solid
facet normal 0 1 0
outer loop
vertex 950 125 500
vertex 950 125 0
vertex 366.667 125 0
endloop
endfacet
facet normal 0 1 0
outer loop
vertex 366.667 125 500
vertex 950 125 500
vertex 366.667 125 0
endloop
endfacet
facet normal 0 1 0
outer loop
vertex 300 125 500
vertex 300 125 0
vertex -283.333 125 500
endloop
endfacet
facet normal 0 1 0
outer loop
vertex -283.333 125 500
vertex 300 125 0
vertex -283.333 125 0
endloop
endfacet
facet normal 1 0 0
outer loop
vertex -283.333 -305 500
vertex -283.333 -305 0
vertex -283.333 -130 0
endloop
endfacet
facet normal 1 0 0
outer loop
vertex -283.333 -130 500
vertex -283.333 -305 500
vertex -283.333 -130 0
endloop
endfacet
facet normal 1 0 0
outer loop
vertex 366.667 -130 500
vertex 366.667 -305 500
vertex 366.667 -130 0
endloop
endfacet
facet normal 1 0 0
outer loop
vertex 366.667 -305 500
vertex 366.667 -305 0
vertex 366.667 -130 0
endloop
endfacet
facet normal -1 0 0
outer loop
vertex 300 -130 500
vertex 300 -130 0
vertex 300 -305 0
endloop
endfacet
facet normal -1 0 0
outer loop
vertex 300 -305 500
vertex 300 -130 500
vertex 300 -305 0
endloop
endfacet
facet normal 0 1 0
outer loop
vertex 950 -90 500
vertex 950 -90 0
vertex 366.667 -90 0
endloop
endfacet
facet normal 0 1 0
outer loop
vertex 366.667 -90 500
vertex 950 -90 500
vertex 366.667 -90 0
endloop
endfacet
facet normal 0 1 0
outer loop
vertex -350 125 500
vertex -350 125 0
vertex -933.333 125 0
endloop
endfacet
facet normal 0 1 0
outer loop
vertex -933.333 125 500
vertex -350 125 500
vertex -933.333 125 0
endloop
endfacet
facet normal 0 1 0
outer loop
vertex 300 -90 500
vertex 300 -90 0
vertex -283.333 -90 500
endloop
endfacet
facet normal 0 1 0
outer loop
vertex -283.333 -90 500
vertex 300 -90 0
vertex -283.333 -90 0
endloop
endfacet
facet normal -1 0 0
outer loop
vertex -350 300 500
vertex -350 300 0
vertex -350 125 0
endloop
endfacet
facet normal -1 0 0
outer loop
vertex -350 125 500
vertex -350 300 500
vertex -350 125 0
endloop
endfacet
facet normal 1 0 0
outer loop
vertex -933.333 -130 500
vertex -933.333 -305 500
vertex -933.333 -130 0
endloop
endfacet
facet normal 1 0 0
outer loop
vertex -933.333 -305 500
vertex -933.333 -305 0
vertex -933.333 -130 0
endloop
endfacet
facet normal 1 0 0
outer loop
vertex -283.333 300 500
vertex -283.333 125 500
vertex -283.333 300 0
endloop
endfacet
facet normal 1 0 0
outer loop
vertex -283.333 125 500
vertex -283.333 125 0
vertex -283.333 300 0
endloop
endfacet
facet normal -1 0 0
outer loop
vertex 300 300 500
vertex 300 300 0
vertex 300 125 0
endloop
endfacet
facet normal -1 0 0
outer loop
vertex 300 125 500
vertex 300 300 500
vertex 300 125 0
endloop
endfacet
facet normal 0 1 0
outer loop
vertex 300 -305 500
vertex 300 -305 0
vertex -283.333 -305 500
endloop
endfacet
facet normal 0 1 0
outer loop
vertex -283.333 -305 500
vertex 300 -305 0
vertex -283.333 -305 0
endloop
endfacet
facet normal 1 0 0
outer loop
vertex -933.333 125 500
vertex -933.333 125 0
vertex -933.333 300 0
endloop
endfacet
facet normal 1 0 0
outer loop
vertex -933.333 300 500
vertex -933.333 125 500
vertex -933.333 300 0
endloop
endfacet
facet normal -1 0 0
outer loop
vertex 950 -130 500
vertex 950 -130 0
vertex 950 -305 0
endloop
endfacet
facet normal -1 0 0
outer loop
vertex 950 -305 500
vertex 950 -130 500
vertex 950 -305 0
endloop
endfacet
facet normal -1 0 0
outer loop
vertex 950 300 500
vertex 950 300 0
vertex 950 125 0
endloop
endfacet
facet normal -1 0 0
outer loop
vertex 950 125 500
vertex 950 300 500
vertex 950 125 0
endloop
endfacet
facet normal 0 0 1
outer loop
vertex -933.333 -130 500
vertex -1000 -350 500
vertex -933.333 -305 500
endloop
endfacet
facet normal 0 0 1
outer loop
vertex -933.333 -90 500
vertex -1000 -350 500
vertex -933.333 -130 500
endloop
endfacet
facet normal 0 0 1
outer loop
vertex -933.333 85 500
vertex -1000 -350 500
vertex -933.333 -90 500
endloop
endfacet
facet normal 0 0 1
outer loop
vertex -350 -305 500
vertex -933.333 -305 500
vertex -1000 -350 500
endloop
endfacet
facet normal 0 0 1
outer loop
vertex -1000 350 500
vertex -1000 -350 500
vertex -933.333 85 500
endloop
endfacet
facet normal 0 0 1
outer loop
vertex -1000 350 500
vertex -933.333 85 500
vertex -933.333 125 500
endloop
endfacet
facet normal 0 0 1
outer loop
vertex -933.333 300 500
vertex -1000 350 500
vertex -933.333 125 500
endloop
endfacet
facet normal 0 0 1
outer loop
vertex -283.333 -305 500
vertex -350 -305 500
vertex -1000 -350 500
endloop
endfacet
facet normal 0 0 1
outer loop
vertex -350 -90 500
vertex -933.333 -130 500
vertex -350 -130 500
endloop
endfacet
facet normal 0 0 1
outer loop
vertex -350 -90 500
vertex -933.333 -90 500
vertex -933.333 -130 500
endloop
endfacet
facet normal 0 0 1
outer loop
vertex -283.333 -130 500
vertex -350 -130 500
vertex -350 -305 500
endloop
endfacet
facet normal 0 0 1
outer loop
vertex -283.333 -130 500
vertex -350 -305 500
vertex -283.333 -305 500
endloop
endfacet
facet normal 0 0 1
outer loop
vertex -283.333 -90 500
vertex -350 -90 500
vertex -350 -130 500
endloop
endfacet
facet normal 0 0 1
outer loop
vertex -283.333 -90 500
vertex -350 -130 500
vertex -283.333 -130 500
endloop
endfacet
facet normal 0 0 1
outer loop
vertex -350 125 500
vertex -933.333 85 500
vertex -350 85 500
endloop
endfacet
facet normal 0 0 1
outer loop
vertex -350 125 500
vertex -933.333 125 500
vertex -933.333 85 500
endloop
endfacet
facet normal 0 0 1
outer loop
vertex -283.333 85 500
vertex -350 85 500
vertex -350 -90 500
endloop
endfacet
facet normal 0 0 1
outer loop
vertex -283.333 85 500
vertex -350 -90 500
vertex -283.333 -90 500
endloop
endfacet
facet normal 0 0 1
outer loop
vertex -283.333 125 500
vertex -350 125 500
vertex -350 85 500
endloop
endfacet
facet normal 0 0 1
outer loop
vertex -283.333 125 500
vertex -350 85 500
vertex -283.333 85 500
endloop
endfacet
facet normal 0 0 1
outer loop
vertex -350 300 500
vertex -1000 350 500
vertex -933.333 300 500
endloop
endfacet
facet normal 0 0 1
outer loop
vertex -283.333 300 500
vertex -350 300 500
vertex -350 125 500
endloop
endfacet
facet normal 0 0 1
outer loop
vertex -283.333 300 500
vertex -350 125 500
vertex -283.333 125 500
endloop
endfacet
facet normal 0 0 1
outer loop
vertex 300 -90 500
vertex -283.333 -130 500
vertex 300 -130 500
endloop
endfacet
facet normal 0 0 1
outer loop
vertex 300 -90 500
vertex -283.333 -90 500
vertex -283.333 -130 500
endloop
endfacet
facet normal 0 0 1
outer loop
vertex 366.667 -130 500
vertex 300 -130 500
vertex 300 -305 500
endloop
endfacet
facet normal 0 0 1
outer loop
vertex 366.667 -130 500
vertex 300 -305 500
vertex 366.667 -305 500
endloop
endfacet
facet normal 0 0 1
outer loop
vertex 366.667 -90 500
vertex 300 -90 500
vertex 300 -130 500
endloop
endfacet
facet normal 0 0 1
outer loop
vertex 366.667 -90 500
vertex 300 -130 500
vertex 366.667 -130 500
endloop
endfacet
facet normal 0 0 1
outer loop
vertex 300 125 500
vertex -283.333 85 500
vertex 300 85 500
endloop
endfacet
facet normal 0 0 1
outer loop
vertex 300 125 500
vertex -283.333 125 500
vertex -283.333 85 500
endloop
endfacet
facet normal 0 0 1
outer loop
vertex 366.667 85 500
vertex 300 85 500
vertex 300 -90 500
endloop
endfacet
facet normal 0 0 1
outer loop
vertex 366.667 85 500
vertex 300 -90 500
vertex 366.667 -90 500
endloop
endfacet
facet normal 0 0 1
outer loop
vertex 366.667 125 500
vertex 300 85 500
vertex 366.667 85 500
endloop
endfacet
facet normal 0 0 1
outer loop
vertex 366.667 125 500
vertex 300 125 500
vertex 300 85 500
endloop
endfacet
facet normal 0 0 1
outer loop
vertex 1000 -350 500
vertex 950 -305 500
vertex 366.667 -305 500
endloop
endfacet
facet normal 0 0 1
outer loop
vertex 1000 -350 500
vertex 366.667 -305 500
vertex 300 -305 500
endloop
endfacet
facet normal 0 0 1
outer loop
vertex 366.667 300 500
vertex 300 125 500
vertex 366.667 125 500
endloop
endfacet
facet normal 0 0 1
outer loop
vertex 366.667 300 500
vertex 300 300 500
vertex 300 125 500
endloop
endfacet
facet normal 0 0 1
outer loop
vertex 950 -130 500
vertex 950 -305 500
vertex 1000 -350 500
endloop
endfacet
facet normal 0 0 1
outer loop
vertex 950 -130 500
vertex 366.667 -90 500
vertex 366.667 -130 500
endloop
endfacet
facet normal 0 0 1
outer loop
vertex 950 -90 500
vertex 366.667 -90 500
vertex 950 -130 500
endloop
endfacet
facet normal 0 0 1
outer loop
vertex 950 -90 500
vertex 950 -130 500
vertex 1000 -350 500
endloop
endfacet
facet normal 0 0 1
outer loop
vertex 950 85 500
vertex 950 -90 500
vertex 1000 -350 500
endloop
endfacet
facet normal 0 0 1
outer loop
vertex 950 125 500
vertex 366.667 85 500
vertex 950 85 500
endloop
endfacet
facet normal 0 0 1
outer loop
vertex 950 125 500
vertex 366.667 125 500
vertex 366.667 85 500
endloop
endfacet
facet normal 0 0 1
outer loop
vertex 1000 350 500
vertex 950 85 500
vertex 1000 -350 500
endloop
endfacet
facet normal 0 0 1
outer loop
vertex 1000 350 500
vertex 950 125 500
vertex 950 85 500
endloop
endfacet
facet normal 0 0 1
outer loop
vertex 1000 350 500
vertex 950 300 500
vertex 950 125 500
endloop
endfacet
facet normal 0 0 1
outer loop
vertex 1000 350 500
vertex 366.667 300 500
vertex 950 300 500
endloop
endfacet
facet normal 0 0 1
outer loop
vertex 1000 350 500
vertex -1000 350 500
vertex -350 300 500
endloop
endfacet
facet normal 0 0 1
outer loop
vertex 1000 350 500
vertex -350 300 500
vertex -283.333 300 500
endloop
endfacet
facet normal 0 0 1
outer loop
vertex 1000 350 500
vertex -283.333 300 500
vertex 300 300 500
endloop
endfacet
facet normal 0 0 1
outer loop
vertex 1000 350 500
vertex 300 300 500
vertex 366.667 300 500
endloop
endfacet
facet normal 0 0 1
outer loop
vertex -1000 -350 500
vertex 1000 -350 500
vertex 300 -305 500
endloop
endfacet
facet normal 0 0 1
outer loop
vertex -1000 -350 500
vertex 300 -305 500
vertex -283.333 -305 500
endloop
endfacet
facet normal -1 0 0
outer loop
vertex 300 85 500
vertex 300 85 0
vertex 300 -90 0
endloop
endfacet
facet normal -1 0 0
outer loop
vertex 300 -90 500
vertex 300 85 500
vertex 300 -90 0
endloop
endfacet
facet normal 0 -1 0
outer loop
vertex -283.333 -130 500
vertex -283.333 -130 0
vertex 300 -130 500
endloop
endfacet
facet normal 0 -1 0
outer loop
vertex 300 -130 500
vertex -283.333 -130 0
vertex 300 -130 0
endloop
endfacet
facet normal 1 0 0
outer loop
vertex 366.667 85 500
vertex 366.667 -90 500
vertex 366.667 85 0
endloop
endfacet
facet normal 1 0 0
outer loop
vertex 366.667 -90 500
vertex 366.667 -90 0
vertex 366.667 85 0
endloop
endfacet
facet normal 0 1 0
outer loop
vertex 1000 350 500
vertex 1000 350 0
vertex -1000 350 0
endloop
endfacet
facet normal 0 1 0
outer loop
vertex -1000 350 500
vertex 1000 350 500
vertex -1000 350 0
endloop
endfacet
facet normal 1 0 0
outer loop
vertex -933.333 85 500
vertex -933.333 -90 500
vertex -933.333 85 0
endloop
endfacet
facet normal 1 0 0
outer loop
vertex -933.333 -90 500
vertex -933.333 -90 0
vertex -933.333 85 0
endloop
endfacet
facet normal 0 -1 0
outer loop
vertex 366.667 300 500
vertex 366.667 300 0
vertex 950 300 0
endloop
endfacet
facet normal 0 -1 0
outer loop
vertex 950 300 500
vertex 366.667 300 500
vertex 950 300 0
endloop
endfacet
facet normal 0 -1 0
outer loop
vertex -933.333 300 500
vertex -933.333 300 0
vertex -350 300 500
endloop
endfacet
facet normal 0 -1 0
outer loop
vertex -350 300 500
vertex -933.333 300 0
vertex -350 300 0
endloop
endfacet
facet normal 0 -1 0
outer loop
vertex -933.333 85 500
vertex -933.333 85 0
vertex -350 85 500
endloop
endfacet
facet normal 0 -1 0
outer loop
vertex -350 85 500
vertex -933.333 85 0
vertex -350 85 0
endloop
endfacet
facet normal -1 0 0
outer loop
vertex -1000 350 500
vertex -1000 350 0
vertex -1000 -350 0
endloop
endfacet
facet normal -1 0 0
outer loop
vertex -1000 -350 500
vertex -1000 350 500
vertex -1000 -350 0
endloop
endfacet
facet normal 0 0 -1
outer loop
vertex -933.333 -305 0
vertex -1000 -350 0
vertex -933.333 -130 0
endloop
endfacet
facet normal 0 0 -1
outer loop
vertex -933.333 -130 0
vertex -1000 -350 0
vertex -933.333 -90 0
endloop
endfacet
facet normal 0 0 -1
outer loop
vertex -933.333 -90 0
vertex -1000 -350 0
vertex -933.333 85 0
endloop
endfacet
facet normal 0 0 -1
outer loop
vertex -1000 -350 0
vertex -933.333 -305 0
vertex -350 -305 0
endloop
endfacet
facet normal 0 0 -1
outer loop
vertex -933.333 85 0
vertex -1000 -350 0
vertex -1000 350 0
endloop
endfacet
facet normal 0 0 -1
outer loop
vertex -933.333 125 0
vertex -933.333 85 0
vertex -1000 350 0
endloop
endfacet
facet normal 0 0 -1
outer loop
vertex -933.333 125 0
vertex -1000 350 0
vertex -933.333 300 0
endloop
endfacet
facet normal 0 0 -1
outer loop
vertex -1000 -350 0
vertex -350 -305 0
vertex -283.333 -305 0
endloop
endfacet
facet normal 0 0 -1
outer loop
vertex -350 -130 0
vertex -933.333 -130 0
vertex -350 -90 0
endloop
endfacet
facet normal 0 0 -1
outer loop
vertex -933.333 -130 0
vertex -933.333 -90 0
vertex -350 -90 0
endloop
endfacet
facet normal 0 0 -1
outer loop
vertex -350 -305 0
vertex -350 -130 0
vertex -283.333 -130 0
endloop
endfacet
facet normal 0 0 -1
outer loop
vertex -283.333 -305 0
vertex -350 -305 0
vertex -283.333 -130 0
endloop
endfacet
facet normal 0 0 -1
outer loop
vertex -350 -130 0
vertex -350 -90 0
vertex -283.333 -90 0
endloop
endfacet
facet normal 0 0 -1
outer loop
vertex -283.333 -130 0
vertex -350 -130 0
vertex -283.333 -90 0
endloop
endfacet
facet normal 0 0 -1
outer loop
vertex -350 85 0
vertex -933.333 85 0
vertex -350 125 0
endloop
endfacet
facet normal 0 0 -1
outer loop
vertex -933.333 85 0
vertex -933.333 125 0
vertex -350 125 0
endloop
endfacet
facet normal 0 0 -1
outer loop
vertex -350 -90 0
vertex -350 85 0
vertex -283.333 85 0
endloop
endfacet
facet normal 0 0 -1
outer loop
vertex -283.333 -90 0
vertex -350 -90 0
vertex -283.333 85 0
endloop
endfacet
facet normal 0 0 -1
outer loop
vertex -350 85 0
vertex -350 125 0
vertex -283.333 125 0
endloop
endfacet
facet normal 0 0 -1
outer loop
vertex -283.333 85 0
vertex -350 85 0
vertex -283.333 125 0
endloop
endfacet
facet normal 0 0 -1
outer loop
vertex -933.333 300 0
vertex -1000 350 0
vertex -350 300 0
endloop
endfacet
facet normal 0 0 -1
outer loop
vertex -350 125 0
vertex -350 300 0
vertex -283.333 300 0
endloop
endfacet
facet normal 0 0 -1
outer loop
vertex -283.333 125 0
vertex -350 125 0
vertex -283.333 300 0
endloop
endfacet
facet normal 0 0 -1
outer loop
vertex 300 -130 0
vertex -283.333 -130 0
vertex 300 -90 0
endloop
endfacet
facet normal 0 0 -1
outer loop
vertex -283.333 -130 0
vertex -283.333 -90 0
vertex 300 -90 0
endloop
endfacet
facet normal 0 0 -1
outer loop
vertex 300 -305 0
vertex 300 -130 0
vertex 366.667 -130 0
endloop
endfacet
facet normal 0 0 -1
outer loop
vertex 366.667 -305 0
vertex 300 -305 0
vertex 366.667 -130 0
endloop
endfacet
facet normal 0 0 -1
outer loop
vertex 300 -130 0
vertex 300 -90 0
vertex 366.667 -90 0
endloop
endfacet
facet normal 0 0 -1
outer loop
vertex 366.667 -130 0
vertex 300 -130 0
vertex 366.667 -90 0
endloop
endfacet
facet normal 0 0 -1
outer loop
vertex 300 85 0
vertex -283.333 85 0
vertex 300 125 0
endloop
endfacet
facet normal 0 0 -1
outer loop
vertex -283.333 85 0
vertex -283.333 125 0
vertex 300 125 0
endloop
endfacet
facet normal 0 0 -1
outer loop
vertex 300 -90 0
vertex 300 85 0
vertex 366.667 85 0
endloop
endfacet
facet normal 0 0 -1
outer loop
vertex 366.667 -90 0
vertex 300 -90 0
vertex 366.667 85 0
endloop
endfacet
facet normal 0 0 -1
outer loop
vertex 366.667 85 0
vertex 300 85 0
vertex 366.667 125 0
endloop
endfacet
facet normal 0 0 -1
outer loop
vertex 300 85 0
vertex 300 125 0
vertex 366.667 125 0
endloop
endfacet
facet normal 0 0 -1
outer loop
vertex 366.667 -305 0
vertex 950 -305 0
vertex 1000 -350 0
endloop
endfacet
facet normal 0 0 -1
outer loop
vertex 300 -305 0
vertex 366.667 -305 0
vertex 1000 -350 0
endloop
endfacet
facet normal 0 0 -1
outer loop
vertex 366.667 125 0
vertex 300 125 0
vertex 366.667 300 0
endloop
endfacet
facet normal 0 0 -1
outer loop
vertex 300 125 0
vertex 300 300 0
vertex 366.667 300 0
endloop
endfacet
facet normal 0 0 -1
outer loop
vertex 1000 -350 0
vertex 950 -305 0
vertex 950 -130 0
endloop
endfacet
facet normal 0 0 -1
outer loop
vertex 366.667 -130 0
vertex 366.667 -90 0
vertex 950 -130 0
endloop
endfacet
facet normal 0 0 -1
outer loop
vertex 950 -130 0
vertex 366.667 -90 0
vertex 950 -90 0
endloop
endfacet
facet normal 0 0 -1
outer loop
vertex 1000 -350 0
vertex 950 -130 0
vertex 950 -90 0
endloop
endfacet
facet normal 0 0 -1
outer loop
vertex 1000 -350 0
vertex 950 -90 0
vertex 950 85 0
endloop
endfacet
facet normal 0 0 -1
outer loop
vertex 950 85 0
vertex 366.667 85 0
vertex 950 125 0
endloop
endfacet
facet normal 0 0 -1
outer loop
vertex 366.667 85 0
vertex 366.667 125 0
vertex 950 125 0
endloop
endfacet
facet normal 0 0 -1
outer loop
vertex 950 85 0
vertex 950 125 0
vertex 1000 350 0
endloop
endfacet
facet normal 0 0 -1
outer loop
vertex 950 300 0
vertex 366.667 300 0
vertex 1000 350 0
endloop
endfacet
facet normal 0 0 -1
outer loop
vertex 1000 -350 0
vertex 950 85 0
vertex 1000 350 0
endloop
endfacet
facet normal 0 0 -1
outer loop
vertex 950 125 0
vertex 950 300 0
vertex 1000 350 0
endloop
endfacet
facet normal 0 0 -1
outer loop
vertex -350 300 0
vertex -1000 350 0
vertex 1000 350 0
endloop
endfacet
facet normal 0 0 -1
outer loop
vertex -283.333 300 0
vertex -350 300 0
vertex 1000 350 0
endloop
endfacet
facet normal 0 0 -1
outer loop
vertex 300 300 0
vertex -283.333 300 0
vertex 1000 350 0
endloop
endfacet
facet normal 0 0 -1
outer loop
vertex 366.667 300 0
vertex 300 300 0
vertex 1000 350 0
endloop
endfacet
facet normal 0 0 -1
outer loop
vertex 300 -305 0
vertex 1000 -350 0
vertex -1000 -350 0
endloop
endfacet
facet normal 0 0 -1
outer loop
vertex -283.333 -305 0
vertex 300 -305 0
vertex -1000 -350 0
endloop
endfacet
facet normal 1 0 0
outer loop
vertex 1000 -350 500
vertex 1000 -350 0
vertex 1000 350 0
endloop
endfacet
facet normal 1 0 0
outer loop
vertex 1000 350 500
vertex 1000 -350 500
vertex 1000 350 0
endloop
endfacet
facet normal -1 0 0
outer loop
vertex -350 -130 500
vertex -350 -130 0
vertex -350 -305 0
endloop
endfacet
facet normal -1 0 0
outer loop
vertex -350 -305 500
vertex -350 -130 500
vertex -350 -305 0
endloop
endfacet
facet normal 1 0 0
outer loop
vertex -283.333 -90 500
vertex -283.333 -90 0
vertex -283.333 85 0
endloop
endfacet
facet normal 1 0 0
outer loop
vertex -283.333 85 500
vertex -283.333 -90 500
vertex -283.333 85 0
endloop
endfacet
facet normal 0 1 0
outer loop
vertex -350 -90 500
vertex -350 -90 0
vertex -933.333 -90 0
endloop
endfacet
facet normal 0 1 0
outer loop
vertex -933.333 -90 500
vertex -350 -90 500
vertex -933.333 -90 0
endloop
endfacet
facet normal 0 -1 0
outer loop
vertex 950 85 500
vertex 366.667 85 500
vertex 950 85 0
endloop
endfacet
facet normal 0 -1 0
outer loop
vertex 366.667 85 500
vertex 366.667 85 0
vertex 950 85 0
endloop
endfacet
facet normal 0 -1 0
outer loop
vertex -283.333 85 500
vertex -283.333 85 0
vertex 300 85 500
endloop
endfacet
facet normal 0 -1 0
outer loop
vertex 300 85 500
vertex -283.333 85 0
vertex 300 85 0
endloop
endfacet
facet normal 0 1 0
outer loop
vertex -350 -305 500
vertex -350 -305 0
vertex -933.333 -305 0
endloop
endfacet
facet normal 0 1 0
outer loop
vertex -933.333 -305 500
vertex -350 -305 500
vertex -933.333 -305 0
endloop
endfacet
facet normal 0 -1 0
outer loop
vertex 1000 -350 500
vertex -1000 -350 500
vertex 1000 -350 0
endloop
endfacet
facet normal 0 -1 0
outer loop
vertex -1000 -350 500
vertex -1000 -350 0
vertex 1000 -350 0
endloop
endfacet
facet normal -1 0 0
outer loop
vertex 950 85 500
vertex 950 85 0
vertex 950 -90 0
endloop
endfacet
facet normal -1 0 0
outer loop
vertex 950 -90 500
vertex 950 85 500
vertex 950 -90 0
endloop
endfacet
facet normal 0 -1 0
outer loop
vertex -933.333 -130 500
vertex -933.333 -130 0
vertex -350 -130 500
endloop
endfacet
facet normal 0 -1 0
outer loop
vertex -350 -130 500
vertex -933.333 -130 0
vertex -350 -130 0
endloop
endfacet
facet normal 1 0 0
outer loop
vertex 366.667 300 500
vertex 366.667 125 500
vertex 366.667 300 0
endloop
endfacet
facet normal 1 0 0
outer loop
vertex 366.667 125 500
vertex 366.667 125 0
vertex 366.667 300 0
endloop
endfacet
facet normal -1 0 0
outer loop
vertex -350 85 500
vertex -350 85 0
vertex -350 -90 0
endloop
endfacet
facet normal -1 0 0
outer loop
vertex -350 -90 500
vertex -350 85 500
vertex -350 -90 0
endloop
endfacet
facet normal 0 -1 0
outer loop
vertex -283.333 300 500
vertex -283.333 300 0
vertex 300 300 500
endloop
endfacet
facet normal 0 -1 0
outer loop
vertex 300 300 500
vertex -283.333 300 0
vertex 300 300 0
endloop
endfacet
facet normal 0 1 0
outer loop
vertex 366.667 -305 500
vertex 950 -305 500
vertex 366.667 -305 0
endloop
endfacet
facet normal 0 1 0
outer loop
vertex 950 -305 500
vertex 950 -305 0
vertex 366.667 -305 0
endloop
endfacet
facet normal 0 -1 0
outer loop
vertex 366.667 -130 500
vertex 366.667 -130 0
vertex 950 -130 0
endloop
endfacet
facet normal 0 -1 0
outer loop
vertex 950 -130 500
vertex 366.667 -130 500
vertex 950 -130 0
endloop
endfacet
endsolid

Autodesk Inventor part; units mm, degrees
ref_plane "YZ Plane" through (0, 0, 0) normal (1, 0, 0) x (0, 1, 0)
ref_plane "XZ Plane" through (0, 0, 0) normal (0, 1, 0) x (-1, 0, 0)
ref_plane "XY Plane" through (0, 0, 0) normal (0, 0, 1) x (1, 0, 0)
sketch "Esquisse1" plane through (0, 0, 0) normal (0, 0, 1) x (1, 0, 0)
  line L0 (-1000, -350) -> (1000, -350)
  line L1 (1000, -350) -> (1000, 350)
  line L2 (1000, 350) -> (-1000, 350)
  line L3 (-1000, 350) -> (-1000, -350)
  line L4 (-1000, -350) -> (1000, 350) construction
  line L5 (1000, -350) -> (-1000, 350) construction
  point P0 (0, 0)
  dimension "d0" = 2000
  dimension "d1" = 700
extrude "Extrusion1" add sketch "Esquisse1" along normal blind 500
sketch "Esquisse3" plane through (0, 0, 0) normal (0, 0, -1) x (-1, 0, 0)
  line L0 (-950, 125) -> (-366.6667, 125)
  line L1 (-366.6667, 125) -> (-366.6667, 300)
  line L2 (-366.6667, 300) -> (-950, 300)
  line L3 (-950, 300) -> (-950, 125)
  line L4 (-1000, 350) -> (1000, 350) projected
  line L5 (-1000, -350) -> (-1000, 350) projected
  point P0 (0, 0)
  dimension "d4" = 175
  dimension "d5" = 583.3333
  dimension "d6" = 50
  dimension "d7" = 50
extrude "Extrusion2" cut sketch "Esquisse3" against normal through all
pattern_linear "Réseau rectangulaire1" count 3 spacing 650 along (-1, 0, 0) of "Extrusion2"
pattern_linear "Réseau rectangulaire2" count 3 spacing 215 along (0, -1, 0) of "Extrusion2", "Réseau rectangulaire1"
properties part number "1420-14-06 Meuble noir" material "Bois (bouleau)"
